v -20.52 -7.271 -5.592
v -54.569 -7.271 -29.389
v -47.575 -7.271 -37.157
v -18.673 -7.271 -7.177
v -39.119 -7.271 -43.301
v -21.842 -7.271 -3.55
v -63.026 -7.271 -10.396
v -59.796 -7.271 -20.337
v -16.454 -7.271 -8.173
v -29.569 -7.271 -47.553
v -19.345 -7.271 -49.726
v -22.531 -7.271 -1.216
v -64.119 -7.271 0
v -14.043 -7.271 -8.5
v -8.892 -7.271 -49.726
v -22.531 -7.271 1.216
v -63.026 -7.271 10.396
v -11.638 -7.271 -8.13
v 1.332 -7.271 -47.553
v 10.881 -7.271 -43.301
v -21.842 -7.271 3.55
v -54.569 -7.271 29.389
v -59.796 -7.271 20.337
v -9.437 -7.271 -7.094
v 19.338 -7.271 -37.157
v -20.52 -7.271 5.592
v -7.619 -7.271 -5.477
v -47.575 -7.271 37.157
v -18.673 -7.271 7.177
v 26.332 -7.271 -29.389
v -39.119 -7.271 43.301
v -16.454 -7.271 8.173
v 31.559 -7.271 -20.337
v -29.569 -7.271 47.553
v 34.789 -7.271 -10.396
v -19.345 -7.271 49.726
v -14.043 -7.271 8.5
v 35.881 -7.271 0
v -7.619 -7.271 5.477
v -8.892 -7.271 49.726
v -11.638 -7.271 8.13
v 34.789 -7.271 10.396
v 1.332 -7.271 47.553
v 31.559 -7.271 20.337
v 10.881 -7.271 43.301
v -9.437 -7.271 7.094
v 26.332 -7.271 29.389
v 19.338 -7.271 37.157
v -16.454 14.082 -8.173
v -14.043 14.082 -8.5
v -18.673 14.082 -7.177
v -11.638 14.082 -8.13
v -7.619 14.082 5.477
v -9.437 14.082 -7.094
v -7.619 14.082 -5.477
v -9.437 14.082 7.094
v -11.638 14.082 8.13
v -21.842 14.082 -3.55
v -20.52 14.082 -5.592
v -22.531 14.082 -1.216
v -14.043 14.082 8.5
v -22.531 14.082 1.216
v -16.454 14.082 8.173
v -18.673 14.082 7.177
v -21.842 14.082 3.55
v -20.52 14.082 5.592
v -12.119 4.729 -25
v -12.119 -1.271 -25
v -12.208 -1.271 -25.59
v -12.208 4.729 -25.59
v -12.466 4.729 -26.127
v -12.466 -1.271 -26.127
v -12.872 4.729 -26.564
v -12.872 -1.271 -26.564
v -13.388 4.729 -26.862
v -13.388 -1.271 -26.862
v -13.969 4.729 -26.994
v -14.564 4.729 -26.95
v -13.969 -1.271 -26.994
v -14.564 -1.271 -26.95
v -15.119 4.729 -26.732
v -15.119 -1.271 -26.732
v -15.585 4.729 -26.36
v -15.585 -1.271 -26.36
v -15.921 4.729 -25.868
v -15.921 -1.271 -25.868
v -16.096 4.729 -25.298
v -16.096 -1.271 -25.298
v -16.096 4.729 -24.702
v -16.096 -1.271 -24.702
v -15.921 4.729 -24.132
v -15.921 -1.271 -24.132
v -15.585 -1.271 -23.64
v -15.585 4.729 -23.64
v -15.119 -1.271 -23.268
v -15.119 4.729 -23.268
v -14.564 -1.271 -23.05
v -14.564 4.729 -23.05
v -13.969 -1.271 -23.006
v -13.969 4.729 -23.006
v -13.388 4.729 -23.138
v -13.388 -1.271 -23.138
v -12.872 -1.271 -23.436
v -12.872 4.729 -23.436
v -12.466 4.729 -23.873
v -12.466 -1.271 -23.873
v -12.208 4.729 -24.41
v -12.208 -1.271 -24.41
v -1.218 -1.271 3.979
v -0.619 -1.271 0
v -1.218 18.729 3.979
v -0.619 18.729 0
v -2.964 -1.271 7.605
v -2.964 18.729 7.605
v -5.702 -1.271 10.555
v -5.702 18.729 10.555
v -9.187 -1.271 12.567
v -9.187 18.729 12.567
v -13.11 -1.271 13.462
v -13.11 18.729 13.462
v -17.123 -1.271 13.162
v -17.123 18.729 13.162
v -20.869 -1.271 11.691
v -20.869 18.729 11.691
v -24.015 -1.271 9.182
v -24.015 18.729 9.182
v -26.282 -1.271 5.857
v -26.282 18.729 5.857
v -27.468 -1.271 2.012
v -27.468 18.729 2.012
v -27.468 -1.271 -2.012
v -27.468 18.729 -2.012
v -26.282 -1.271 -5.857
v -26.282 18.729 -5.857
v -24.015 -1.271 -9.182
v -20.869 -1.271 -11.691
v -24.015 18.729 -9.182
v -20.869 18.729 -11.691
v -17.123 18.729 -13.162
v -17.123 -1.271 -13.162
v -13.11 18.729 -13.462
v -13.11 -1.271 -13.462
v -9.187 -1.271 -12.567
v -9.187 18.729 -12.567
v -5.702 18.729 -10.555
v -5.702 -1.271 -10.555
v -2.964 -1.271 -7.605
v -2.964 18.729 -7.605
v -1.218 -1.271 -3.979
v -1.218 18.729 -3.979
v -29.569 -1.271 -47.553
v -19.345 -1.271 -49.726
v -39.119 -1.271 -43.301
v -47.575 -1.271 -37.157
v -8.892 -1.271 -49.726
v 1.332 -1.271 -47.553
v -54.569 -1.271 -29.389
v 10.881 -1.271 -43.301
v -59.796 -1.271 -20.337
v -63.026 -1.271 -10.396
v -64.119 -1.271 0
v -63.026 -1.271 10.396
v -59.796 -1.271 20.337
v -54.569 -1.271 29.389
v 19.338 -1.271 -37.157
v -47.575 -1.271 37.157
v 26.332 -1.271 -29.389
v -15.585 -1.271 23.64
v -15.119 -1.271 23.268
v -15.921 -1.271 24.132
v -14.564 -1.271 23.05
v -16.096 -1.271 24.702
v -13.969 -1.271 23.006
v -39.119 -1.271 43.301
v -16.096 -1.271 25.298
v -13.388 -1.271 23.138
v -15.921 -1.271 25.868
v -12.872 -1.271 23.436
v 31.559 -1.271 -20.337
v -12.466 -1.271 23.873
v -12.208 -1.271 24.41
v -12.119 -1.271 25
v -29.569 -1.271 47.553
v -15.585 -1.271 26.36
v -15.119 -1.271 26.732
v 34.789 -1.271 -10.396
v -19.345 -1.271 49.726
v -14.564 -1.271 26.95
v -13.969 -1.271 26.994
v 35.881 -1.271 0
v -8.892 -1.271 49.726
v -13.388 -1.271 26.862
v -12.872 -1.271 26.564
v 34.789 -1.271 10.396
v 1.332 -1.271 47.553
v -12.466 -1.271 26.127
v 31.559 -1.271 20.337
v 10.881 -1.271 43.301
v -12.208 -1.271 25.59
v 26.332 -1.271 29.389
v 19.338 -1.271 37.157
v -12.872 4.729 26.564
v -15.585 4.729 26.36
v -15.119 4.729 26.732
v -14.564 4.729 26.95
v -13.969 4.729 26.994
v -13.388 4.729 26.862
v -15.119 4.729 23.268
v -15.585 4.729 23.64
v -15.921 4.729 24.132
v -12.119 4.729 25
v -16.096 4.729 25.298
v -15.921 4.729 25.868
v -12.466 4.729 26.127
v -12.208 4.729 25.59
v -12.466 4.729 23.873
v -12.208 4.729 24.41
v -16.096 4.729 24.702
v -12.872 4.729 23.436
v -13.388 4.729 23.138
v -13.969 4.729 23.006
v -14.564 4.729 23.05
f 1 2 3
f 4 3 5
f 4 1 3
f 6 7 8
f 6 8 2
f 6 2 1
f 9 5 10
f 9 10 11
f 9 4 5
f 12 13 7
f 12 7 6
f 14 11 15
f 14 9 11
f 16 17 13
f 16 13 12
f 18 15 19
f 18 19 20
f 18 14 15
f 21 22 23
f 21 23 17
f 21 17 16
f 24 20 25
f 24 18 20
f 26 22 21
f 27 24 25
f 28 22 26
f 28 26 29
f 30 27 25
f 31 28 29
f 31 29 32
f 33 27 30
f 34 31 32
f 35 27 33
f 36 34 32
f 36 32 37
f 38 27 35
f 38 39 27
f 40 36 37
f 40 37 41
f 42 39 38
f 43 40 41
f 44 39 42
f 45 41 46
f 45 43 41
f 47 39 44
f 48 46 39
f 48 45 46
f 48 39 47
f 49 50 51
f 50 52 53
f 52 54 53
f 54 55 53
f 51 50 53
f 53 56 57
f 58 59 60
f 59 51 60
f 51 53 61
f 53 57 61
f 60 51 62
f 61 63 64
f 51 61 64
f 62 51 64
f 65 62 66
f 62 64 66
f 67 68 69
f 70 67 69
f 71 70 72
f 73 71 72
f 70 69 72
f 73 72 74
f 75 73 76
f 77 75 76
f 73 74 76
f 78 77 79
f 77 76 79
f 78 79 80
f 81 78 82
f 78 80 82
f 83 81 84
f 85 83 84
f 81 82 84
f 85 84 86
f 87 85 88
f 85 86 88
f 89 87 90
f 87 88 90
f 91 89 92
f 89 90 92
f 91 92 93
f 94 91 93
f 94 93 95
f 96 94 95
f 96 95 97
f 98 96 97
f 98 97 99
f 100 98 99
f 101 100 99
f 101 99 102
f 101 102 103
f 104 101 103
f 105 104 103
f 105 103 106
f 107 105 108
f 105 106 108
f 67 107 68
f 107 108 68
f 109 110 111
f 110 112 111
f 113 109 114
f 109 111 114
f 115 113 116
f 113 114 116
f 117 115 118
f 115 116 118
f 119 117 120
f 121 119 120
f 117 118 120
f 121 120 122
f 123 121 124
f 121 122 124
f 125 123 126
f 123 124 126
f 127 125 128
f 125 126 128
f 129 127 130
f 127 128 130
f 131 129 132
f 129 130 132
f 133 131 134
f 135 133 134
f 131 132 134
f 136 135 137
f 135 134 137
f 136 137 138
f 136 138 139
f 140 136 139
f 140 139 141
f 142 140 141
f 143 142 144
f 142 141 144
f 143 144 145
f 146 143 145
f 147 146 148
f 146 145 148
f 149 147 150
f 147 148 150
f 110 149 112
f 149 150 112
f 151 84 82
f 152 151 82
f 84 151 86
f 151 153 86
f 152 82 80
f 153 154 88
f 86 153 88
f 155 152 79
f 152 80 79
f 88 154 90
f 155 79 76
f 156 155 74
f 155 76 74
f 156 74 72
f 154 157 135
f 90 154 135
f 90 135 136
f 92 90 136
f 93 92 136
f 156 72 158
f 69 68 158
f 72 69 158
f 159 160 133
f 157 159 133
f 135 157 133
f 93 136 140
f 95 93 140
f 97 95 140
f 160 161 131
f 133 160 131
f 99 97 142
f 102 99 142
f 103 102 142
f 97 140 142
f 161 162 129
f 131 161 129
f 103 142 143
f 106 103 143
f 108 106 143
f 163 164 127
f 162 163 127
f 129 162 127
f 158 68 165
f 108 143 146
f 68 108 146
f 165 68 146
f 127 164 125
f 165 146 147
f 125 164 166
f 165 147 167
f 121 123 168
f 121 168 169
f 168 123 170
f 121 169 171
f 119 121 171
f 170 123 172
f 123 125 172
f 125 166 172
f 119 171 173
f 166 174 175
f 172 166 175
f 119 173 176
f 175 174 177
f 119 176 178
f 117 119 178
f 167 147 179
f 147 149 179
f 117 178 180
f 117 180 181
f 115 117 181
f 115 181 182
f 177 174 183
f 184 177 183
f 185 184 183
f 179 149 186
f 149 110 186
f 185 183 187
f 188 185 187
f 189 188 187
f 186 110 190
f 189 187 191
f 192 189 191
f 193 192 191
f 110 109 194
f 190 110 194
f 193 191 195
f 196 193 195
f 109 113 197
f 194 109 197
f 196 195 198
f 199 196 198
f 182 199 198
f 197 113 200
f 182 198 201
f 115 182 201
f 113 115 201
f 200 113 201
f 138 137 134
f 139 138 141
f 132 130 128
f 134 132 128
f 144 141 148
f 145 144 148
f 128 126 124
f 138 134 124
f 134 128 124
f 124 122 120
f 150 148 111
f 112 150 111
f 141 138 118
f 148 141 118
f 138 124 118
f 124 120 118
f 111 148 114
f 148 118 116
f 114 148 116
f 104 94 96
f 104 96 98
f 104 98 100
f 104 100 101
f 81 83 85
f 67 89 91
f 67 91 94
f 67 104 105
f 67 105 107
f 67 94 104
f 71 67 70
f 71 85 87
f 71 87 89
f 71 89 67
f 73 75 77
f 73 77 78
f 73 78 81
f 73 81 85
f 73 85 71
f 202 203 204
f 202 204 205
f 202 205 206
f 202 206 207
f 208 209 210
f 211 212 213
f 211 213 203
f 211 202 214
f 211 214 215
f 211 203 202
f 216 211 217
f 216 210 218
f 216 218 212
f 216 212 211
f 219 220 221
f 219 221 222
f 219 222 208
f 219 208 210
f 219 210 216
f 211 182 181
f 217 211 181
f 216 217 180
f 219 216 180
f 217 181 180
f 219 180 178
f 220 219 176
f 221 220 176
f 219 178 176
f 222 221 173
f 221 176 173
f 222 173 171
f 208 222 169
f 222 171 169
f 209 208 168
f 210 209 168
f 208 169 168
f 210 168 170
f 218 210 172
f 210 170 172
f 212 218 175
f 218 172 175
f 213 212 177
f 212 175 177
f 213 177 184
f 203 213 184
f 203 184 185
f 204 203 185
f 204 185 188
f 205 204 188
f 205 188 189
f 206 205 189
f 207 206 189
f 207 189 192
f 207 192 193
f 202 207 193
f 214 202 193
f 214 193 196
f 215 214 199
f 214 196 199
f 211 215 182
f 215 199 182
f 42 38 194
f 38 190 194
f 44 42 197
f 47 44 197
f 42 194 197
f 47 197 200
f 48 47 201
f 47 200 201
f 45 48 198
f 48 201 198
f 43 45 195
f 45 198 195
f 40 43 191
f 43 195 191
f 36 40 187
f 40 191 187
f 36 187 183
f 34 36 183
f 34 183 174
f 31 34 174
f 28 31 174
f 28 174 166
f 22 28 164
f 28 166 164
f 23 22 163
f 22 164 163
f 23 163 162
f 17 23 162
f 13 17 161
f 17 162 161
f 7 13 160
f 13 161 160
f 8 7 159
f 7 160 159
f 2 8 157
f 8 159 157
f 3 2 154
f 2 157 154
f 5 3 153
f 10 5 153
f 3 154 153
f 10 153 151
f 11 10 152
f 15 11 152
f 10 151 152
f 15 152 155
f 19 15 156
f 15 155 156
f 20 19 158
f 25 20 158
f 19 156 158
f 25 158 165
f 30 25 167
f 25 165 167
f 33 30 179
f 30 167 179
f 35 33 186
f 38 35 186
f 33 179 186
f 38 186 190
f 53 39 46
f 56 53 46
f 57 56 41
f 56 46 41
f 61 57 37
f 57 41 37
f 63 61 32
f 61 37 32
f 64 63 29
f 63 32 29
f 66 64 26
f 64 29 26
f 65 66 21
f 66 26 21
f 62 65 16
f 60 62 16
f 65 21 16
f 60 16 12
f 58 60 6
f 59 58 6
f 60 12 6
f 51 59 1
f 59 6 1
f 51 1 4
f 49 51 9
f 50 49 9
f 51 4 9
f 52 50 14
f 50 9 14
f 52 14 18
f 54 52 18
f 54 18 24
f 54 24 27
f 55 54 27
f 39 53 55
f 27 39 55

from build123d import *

# Parameters (mm, degrees)
ESQUISSE2_R        = 2
BOSS_EXTRU_1_DEPTH = 6
BOSS_EXTRU_2_DEPTH = 25


with BuildPart() as part:
    # Esquisse1 → Révolution4 (revolve)
    with BuildSketch(Plane.XY):
        Polygon((-5.618645861, -7.271198097), (35.881354139, -7.271198097), (35.881354139, -1.271198097), (-0.618645861, -1.271198097), (-0.618645861, 18.728801903), (-14.118645861, 18.728801903), (-14.118645861, 14.081661898), (-5.618645861, 14.081661898), align=None)
    revolve(axis=Axis((-14.118645861, 18.728801903, 0), (0, -1, 0)))

    # Esquisse2 → Boss.-Extru.1 (add)
    with BuildSketch(Plane(origin=(0, -1.271198097, 0), x_dir=(1, 0, 0), z_dir=(0, 1, 0))):
        with Locations((-14.118645861, -25)):
            Circle(ESQUISSE2_R)
        with Locations((-14.118645861, 25)):
            Circle(ESQUISSE2_R)
    extrude(amount=BOSS_EXTRU_1_DEPTH)

    # Esquisse3 → Boss.-Extru.2 (add)
    with BuildSketch(Plane.XZ.offset(7.271198097)):
        with BuildLine():
            ThreePointArc((-7.618645861, -5.477225575), (-6.13428615, -2.915475947), (-5.618645861, 0))
            ThreePointArc((-5.618645861, 0), (-6.13428615, 2.915475947), (-7.618645861, 5.477225575))
            Line((-7.618645861, 5.477225575), (-7.618645861, 0))
            Line((-7.618645861, 0), (-7.618645861, -5.477225575))
        make_face()
    extrude(amount=-BOSS_EXTRU_2_DEPTH)


solid = part.part
